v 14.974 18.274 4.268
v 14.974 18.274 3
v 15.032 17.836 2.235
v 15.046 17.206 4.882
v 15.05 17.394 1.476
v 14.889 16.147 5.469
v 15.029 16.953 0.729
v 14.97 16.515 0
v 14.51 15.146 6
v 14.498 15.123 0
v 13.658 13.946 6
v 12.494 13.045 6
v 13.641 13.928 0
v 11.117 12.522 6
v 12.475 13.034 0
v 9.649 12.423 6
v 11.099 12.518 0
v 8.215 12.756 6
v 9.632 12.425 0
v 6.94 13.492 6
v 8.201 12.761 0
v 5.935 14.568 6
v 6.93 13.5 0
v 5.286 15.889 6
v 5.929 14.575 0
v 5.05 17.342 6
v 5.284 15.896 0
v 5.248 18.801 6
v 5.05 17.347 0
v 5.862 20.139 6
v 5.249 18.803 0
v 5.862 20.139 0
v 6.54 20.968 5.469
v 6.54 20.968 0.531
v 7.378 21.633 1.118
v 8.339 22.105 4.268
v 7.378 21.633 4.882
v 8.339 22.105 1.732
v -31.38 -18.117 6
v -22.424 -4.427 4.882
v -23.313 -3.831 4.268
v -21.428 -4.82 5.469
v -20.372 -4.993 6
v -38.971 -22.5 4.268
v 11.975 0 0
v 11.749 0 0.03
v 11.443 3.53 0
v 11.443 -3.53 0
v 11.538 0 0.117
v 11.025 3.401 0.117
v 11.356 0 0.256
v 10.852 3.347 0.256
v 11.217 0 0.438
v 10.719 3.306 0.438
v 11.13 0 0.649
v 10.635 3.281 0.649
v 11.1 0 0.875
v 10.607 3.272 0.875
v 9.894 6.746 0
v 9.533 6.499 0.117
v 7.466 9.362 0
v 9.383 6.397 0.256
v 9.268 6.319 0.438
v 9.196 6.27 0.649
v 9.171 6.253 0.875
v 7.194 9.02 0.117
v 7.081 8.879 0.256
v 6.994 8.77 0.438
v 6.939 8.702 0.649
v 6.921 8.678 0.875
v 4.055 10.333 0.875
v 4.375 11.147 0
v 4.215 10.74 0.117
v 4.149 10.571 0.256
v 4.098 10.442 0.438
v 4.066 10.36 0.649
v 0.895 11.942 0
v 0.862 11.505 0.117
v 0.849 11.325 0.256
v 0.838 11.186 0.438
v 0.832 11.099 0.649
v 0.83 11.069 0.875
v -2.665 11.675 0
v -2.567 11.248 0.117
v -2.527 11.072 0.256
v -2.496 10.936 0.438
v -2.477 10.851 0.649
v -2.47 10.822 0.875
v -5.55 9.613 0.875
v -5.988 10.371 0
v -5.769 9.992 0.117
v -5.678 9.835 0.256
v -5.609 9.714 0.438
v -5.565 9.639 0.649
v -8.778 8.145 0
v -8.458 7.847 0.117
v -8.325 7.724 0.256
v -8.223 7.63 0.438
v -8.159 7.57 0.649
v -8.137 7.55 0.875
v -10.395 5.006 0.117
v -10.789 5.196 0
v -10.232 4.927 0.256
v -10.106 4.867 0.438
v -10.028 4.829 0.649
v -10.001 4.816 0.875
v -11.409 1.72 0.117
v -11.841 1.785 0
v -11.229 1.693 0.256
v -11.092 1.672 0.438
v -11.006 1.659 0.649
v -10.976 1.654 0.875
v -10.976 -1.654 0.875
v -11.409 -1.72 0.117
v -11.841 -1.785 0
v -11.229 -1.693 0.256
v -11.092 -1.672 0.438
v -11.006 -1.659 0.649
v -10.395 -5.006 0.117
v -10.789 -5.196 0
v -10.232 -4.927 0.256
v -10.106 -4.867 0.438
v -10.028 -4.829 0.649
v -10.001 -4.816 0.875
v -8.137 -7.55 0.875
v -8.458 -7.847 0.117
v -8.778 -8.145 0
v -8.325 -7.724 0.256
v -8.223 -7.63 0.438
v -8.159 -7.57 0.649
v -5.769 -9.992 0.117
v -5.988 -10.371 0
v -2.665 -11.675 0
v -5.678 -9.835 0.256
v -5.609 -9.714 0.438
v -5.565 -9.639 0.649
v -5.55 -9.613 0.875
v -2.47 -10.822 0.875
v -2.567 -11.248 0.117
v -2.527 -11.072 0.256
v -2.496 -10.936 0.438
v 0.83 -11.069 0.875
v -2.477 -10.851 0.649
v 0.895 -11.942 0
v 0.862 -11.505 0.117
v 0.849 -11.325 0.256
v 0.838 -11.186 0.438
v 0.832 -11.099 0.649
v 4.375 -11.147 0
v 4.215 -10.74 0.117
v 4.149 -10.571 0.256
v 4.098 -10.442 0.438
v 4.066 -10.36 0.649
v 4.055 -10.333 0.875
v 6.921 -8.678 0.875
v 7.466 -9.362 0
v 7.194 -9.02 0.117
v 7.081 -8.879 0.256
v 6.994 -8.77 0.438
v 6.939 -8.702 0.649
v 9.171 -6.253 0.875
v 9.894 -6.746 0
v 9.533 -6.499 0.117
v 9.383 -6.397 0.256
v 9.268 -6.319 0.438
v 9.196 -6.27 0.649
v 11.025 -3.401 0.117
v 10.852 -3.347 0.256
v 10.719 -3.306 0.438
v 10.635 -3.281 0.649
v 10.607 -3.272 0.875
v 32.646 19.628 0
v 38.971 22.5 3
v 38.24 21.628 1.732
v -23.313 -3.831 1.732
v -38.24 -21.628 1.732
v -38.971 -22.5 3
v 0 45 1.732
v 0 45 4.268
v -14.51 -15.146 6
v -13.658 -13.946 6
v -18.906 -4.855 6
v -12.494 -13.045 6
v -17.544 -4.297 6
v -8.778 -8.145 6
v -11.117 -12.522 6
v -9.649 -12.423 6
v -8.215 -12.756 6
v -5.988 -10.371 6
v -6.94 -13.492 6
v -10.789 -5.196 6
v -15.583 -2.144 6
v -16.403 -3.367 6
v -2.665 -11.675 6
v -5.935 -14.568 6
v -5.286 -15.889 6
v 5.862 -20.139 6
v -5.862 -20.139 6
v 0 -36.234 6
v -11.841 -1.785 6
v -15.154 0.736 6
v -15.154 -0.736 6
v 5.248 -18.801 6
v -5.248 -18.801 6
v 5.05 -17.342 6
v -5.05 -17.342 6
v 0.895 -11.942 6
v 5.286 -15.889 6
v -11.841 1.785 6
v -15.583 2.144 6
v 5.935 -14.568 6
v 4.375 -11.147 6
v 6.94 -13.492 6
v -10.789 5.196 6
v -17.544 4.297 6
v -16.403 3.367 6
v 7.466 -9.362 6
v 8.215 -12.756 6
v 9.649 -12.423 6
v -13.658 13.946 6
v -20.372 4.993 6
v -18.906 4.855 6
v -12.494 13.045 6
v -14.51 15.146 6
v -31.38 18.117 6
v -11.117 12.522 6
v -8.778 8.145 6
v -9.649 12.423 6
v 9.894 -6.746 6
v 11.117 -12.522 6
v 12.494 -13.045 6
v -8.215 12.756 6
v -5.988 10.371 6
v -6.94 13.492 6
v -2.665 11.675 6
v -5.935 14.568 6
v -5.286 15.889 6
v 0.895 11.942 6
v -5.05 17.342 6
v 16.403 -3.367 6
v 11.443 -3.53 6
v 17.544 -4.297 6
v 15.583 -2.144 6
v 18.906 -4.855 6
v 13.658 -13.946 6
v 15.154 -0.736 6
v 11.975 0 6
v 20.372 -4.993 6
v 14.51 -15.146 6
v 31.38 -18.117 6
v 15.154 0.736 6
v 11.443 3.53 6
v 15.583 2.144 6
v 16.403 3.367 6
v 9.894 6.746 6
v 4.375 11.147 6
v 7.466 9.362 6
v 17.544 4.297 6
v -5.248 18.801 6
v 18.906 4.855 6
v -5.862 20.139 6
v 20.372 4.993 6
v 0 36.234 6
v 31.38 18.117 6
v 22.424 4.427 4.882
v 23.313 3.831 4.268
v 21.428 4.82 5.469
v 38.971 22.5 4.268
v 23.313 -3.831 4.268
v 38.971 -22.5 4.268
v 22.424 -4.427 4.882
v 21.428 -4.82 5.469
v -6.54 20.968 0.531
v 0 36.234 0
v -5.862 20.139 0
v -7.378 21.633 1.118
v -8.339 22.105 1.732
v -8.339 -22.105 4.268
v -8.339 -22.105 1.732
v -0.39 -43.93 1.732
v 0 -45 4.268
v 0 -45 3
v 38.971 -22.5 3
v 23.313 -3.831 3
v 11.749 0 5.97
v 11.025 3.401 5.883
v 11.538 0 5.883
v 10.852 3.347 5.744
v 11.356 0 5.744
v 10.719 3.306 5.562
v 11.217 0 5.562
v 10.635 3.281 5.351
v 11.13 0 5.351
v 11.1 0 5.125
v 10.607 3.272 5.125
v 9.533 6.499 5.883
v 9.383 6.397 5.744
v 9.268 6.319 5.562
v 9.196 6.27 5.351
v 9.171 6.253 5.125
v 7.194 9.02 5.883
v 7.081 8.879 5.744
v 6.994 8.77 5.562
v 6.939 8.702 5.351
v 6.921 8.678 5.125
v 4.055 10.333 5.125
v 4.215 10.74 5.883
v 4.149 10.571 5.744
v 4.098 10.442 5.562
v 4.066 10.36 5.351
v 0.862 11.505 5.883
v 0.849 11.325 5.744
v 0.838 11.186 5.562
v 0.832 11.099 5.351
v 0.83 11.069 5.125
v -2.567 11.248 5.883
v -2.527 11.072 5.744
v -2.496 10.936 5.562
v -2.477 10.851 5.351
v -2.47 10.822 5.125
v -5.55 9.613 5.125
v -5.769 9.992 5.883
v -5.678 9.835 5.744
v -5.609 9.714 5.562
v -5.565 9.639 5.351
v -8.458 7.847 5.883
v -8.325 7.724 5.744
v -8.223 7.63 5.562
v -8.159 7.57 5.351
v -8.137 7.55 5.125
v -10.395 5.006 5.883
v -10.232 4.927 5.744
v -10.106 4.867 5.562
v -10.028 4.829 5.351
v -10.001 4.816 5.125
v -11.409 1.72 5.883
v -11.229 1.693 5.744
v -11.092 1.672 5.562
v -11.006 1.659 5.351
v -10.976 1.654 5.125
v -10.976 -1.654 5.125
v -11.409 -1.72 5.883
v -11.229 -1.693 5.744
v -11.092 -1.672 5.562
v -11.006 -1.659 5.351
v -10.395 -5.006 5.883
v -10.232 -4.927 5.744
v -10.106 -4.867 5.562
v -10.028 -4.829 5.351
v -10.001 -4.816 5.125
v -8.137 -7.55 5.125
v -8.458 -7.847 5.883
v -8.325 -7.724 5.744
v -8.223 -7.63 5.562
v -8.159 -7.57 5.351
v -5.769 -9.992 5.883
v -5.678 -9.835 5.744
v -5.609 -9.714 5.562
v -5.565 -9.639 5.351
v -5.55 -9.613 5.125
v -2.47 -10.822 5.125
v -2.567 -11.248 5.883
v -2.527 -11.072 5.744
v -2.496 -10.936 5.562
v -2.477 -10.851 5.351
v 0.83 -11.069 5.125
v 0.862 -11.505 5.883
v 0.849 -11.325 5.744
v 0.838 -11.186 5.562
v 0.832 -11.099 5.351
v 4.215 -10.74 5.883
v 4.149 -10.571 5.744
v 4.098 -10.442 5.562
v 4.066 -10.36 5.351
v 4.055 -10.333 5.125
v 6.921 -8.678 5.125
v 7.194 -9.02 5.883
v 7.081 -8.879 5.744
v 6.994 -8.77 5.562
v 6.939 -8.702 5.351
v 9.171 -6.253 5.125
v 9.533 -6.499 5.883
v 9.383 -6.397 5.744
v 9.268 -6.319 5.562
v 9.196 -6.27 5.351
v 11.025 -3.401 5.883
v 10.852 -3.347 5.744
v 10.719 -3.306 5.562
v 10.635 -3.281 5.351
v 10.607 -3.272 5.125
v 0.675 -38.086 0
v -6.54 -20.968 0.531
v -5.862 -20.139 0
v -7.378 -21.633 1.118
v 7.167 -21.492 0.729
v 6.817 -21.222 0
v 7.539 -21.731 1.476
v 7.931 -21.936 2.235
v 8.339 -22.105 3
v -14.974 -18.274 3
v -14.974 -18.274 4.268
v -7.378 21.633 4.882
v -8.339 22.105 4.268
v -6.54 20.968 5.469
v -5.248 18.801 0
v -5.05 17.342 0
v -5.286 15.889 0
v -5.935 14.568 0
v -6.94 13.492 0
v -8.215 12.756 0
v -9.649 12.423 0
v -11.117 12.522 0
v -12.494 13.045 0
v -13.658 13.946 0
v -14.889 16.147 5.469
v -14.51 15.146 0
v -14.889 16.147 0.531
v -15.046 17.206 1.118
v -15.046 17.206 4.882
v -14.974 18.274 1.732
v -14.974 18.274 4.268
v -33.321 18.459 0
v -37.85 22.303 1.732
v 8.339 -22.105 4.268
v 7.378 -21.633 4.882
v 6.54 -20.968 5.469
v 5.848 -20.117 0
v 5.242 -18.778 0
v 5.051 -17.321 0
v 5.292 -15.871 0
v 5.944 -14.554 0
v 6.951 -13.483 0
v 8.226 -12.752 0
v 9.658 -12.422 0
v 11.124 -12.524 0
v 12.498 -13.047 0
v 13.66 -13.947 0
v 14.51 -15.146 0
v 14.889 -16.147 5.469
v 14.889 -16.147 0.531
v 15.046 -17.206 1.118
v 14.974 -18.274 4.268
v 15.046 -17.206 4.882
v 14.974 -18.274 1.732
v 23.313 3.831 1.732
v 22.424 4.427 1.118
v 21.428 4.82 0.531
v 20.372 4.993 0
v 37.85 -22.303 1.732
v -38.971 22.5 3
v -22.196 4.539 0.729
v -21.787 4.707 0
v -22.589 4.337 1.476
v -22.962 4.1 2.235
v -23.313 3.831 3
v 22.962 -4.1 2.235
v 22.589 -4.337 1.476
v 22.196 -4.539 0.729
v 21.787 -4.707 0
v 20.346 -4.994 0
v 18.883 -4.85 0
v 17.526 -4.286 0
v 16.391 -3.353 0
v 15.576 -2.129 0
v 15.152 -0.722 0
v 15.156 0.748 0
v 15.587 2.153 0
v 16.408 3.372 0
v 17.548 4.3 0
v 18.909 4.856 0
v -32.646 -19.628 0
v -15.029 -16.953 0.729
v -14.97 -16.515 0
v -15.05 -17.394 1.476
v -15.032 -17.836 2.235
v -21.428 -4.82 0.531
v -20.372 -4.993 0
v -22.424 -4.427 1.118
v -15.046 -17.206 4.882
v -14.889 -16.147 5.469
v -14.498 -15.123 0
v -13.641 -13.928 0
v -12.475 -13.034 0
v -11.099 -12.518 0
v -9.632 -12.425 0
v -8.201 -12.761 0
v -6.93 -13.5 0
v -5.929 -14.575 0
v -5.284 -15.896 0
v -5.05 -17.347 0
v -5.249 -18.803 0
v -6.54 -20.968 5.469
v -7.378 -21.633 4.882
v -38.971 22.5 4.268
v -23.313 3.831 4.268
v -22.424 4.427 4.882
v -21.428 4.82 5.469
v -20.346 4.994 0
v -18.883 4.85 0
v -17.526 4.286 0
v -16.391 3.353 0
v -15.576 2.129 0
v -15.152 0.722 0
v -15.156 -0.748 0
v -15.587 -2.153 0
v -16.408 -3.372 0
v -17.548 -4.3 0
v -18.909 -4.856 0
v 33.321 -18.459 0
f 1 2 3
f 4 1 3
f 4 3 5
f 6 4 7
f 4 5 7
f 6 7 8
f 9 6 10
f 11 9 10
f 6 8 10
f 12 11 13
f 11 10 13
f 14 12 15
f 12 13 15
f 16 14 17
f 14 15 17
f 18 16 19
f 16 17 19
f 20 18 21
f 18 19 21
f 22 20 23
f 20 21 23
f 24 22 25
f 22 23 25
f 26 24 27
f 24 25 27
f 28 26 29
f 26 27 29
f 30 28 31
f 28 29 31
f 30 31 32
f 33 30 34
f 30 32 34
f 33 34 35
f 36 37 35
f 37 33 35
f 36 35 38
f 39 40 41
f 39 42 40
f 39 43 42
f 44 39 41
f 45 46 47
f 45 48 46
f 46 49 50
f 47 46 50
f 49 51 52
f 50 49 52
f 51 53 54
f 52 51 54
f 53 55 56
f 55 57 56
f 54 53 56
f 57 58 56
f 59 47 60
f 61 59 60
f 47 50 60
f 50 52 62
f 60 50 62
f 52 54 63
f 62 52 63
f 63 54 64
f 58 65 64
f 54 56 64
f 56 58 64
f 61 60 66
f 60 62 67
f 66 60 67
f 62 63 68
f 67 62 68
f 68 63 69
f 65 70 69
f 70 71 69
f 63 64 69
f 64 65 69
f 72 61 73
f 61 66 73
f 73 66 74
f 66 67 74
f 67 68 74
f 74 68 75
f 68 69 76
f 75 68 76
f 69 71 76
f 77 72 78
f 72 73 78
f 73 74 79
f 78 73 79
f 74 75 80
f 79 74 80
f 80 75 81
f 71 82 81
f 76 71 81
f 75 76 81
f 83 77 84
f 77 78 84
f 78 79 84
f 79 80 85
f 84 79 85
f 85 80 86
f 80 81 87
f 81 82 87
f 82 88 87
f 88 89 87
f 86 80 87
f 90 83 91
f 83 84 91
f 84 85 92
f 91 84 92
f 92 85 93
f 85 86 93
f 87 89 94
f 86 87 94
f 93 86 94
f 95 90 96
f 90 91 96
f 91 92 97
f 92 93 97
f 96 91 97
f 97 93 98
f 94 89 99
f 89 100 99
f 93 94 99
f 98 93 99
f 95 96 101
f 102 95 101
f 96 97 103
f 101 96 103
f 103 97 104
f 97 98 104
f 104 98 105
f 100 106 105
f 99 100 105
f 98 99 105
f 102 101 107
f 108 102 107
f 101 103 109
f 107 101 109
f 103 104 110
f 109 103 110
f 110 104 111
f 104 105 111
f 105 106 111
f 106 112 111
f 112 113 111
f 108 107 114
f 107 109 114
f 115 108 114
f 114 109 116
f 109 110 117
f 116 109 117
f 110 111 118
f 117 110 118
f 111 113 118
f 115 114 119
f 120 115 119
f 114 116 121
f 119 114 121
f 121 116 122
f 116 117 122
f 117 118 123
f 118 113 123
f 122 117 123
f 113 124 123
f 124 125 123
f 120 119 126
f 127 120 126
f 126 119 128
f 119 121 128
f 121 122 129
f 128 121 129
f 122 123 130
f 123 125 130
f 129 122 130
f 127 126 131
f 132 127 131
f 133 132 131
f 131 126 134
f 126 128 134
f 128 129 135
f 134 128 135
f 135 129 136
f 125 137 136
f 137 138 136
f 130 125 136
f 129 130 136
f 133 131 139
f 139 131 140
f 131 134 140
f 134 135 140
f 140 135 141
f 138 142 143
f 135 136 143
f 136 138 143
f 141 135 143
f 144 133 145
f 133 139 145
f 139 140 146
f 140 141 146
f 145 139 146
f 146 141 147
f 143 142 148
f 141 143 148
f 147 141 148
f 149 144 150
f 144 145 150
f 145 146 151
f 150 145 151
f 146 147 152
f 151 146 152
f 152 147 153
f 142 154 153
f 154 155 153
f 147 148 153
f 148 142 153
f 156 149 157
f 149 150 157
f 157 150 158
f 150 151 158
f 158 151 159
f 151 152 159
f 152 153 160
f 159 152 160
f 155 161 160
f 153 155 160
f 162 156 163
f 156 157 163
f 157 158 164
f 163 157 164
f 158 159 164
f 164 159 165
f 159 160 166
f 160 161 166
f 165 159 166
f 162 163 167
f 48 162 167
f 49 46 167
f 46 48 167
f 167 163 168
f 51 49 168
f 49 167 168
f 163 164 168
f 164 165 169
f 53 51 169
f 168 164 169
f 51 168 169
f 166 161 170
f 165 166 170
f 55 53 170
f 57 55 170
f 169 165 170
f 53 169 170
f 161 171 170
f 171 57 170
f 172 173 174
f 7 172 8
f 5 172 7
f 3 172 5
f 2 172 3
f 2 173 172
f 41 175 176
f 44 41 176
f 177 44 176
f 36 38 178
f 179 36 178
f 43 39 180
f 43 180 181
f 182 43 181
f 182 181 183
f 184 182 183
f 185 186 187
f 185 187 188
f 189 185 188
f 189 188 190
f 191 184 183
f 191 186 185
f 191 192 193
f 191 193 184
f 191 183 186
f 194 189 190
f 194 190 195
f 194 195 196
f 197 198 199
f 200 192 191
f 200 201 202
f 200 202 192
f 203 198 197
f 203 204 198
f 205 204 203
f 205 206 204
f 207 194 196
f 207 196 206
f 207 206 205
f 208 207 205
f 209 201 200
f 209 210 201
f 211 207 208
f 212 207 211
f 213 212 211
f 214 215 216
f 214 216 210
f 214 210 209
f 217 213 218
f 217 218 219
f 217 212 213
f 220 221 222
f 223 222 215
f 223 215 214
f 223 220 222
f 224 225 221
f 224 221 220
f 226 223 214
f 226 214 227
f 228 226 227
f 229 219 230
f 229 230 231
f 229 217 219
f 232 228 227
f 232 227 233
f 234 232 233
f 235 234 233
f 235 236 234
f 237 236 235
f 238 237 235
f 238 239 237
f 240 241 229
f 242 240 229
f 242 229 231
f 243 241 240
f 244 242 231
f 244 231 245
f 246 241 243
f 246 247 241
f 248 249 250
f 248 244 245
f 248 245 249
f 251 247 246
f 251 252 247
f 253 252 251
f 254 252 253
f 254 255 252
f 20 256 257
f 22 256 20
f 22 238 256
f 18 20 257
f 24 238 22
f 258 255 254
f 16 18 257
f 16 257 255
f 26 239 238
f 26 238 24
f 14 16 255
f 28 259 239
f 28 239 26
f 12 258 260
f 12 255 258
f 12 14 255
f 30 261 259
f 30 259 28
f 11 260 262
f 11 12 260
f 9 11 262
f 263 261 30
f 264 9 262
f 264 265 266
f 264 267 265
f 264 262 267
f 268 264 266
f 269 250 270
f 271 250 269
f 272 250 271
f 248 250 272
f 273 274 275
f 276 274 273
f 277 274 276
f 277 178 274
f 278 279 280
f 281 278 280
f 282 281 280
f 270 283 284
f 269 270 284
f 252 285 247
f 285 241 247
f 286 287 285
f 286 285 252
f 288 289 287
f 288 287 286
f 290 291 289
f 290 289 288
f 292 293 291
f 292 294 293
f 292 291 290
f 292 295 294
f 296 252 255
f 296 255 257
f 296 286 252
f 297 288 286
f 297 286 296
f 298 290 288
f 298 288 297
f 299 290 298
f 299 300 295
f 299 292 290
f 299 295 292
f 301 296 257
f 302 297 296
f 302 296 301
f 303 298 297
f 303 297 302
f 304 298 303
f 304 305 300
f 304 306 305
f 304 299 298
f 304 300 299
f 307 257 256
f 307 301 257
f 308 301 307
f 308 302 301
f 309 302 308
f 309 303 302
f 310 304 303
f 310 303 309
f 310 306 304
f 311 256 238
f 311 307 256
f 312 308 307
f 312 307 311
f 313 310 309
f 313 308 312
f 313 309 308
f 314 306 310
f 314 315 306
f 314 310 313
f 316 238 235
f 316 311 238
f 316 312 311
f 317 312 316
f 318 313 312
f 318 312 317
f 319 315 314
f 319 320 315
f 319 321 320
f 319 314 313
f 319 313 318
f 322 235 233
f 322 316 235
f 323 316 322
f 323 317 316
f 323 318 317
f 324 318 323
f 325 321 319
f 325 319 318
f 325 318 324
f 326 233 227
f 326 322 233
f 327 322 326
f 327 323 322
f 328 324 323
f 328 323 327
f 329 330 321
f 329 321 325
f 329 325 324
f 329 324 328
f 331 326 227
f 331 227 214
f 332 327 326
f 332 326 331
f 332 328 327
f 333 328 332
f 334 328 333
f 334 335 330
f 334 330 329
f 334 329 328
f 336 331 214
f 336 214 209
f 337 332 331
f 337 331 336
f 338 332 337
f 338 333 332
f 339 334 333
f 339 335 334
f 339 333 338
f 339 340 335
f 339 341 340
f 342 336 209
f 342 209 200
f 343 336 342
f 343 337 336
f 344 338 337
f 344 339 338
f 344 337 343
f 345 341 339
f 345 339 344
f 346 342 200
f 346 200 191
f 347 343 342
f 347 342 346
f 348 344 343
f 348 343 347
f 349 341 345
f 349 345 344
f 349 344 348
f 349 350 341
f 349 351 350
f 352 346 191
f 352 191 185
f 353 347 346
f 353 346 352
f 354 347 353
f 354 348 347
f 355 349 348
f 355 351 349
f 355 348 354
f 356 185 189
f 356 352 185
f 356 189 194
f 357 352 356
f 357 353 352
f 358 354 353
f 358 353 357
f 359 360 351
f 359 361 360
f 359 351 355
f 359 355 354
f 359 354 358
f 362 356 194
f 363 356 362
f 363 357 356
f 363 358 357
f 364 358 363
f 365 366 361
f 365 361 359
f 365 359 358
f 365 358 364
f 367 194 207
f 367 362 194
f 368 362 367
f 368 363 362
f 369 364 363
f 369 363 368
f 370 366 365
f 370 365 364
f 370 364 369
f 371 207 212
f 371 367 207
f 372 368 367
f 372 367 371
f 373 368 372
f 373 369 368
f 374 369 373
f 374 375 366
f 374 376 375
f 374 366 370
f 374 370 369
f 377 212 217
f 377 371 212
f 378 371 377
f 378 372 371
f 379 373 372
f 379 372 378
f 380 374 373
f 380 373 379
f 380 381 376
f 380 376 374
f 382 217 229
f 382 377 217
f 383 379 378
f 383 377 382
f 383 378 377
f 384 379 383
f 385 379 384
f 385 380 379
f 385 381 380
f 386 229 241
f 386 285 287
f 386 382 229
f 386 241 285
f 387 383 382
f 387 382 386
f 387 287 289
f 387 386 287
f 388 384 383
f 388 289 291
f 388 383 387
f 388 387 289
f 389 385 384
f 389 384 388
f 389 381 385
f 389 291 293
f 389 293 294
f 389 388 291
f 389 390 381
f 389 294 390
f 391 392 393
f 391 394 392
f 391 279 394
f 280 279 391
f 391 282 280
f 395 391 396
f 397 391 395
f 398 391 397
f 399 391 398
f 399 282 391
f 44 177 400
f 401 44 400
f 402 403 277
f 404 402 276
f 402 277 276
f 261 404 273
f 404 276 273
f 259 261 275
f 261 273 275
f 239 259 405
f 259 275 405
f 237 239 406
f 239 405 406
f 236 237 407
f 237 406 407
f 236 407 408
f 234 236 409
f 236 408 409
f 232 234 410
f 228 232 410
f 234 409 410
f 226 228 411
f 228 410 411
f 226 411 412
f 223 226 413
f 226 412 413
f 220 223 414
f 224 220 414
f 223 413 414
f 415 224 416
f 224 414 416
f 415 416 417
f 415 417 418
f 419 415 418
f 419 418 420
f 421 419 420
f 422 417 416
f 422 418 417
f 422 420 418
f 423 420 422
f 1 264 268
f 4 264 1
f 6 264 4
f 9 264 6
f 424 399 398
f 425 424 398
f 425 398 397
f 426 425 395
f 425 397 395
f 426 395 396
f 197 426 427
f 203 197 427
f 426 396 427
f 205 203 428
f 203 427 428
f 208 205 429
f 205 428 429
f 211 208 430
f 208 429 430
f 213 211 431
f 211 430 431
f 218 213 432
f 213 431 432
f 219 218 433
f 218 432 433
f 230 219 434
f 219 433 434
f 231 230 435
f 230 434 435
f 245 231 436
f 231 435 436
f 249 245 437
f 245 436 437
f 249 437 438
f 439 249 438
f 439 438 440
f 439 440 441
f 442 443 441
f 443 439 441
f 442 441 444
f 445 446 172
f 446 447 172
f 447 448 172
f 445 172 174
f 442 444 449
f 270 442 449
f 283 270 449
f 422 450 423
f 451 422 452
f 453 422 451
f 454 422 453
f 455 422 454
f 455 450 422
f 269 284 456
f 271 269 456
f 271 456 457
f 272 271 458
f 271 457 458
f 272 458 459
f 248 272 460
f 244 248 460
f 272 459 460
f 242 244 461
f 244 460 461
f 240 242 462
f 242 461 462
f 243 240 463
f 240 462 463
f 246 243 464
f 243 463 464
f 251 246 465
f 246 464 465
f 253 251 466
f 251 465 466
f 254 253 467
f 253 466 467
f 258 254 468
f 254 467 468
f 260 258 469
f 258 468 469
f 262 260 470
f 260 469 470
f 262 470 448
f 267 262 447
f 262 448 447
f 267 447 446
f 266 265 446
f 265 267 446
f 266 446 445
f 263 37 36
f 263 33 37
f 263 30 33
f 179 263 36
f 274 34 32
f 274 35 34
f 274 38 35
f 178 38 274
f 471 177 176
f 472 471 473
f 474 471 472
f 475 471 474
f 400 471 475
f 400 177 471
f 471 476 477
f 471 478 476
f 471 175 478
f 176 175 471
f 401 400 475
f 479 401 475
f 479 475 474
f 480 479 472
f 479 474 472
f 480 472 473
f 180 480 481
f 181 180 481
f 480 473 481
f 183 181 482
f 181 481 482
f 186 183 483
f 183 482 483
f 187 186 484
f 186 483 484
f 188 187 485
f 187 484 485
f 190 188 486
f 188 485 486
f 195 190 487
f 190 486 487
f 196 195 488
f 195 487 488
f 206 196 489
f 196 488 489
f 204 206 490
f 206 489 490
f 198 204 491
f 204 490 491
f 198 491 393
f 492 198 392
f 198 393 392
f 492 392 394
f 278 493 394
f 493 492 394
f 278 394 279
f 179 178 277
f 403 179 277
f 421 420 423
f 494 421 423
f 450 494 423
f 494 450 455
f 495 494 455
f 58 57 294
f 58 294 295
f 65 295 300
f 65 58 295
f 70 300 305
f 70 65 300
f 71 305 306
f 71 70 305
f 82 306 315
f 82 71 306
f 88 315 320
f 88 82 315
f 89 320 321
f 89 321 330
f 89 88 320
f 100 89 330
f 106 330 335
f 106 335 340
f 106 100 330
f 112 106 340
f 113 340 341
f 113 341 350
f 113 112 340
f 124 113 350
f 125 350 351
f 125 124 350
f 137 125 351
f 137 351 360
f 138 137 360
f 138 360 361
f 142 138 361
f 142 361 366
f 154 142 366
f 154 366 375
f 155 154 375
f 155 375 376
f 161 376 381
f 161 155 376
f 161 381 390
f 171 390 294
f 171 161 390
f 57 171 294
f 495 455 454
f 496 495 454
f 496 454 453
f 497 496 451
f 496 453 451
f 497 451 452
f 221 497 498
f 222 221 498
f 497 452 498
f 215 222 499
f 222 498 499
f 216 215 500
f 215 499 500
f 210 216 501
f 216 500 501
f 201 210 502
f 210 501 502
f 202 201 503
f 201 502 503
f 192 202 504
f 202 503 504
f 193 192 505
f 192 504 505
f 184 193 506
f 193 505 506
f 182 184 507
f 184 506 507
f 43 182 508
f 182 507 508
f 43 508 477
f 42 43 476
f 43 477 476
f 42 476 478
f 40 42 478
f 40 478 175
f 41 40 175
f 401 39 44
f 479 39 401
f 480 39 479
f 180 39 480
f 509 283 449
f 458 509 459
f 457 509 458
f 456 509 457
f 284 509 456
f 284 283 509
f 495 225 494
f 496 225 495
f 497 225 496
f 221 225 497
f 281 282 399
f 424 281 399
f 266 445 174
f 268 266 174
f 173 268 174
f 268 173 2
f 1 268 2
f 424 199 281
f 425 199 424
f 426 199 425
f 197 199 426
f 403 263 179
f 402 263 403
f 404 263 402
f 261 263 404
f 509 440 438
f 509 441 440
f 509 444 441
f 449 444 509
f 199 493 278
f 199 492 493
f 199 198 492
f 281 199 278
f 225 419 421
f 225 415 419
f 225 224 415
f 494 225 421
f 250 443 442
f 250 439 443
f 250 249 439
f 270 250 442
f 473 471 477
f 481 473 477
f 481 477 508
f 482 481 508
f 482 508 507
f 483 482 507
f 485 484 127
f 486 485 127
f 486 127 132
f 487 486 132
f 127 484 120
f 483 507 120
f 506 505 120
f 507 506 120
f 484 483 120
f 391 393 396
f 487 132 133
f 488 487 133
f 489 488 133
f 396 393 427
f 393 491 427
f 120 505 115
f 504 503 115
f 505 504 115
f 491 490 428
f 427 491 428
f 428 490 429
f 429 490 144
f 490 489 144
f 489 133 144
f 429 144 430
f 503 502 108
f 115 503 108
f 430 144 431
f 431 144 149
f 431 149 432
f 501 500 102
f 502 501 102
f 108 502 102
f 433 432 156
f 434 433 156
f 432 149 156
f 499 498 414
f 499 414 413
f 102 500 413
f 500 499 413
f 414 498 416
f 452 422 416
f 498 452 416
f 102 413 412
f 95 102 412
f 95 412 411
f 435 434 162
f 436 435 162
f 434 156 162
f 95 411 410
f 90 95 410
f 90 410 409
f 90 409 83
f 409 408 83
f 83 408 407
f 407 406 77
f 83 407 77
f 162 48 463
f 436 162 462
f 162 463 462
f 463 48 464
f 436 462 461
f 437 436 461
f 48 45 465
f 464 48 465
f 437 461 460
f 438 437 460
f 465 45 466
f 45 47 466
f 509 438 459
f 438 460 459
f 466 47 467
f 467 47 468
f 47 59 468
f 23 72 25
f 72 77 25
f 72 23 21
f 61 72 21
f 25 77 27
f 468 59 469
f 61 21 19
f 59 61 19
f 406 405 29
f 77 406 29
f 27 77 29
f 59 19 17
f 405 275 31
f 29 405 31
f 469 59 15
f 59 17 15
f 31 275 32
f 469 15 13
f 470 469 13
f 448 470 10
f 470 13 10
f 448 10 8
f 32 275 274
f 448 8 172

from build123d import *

# Parameters (mm, degrees)
F0_R         = 11.1
F1_DEPTH     = 6
F2_C1_SIZE2  = 3
F2_C1_SIZE   = 1.7320508076
F2_C2_SIZE2  = 3
F2_C2_SIZE   = 1.7320508076
F2_C3_SIZE2  = 3
F2_C3_SIZE   = 1.7320508076
F2_C4_SIZE2  = 3
F2_C4_SIZE   = 1.7320508076
F2_C5_SIZE2  = 1.7320508076
F2_C5_SIZE   = 3
F2_C6_SIZE2  = 3
F2_C6_SIZE   = 1.7320508076
F2_C7_SIZE2  = 1.7320508076
F2_C7_SIZE   = 3
F2_C8_SIZE2  = 3
F2_C8_SIZE   = 1.7320508076
F2_C9_SIZE2  = 1.7320508076
F2_C9_SIZE   = 3
F2_C10_SIZE2 = 3
F2_C10_SIZE  = 1.7320508076
F2_C11_SIZE2 = 3
F2_C11_SIZE  = 1.7320508076
F2_C12_SIZE2 = 3
F2_C12_SIZE  = 1.7320508076
F2_C13_SIZE2 = 1.7320508076
F2_C13_SIZE  = 3
F2_C14_SIZE2 = 3
F2_C14_SIZE  = 1.7320508076
F2_C15_SIZE2 = 3
F2_C15_SIZE  = 1.7320508076
F2_C16_SIZE2 = 3
F2_C16_SIZE  = 1.7320508076
F2_C17_SIZE2 = 1.7320508076
F2_C17_SIZE  = 3
F2_C18_SIZE2 = 3
F2_C18_SIZE  = 1.7320508076
F2_C19_SIZE2 = 3
F2_C19_SIZE  = 1.7320508076
F2_C20_SIZE2 = 3
F2_C20_SIZE  = 1.7320508076
F2_C21_SIZE2 = 1.7320508076
F2_C21_SIZE  = 3
F2_C22_SIZE2 = 3
F2_C22_SIZE  = 1.7320508076
F2_C23_SIZE2 = 3
F2_C23_SIZE  = 1.7320508076
F2_C24_SIZE2 = 3
F2_C24_SIZE  = 1.7320508076
F3_R         = 0.875


with BuildPart() as f1:
    # F0 (on Top) → F1 (new body)
    with BuildSketch(Plane.XY):
        with BuildLine():
            Line((8.3388454559, 22.1051900243), (0, 45))
            Line((0, 45), (-8.3388454559, 22.1051900243))
            ThreePointArc((-8.3388454559, 22.1051900243), (-7.55, 13.0769835971), (-14.9742333886, 18.2742470152))
            Line((-14.9742333886, 18.2742470152), (-38.9711431703, 22.5))
            Line((-38.9711431703, 22.5), (-23.3130788445, 3.8309430091))
            ThreePointArc((-23.3130788445, 3.8309430091), (-15.1, 0), (-23.3130788445, -3.8309430091))
            Line((-23.3130788445, -3.8309430091), (-38.9711431703, -22.5))
            Line((-38.9711431703, -22.5), (-14.9742333886, -18.2742470152))
            ThreePointArc((-14.9742333886, -18.2742470152), (-7.55, -13.0769835971), (-8.3388454559, -22.1051900243))
            Line((-8.3388454559, -22.1051900243), (0, -45))
            Line((0, -45), (8.3388454559, -22.1051900243))
            ThreePointArc((8.3388454559, -22.1051900243), (7.55, -13.0769835971), (14.9742333886, -18.2742470152))
            Line((14.9742333886, -18.2742470152), (38.9711431703, -22.5))
            Line((38.9711431703, -22.5), (23.3130788445, -3.8309430091))
            ThreePointArc((23.3130788445, -3.8309430091), (15.1, 0), (23.3130788445, 3.8309430091))
            Line((23.3130788445, 3.8309430091), (38.9711431703, 22.5))
            Line((38.9711431703, 22.5), (14.9742333886, 18.2742470152))
            ThreePointArc((14.9742333886, 18.2742470152), (7.55, 13.0769835971), (8.3388454559, 22.1051900243))
        make_face()
        Circle(F0_R, mode=Mode.SUBTRACT)
    extrude(amount=F1_DEPTH)

    # F2: chamfer of 3 x 1.7320508076 on 24 edges, made by hand

    # F2_c1
    f2_c1_edges = [f1.edges().sort_by_distance(p)[0] for p in [
        (31.1421110074, 13.1654715045, 0),
    ]]
    f2_c1_side = f1.faces().sort_by_distance((31.1421110074, 13.1654715045, 0.0346410162))[0]
    chamfer(f2_c1_edges, length=F2_C1_SIZE, length2=F2_C1_SIZE2, reference=f2_c1_side)

    # F2_c2
    f2_c2_edges = [f1.edges().sort_by_distance(p)[0] for p in [
        (31.1421110074, 13.1654715045, 6),
    ]]
    f2_c2_side = f1.faces().sort_by_distance((31.1421110074, 13.1654715045, 5.9653589838))[0]
    chamfer(f2_c2_edges, length=F2_C2_SIZE, length2=F2_C2_SIZE2, reference=f2_c2_side)

    # F2_c3
    f2_c3_edges = [f1.edges().sort_by_distance(p)[0] for p in [
        (24.6756919125, 19.9826322901, 0),
    ]]
    f2_c3_side = f1.faces().sort_by_distance((24.6816996097, 19.9485162005, 0))[0]
    chamfer(f2_c3_edges, length=F2_C3_SIZE, length2=F2_C3_SIZE2, reference=f2_c3_side)

    # F2_c4
    f2_c4_edges = [f1.edges().sort_by_distance(p)[0] for p in [
        (24.6756919125, 19.9826322901, 6),
    ]]
    f2_c4_side = f1.faces().sort_by_distance((24.6756919125, 19.9826322901, 5.9653589838))[0]
    chamfer(f2_c4_edges, length=F2_C4_SIZE, length2=F2_C4_SIZE2, reference=f2_c4_side)

    # F2_c5
    f2_c5_edges = [f1.edges().sort_by_distance(p)[0] for p in [
        (4.169422728, 33.5525950122, 0),
    ]]
    f2_c5_side = f1.faces().sort_by_distance((4.136873479, 33.5407397857, 0))[0]
    chamfer(f2_c5_edges, length=F2_C5_SIZE, length2=F2_C5_SIZE2, reference=f2_c5_side)

    # F2_c6
    f2_c6_edges = [f1.edges().sort_by_distance(p)[0] for p in [
        (4.169422728, 33.5525950122, 6),
    ]]
    f2_c6_side = f1.faces().sort_by_distance((4.169422728, 33.5525950122, 5.9653589838))[0]
    chamfer(f2_c6_edges, length=F2_C6_SIZE, length2=F2_C6_SIZE2, reference=f2_c6_side)

    # F2_c7
    f2_c7_edges = [f1.edges().sort_by_distance(p)[0] for p in [
        (-4.9676212415, 31.3610921973, 0),
    ]]
    f2_c7_side = f1.faces().sort_by_distance((-4.9350719925, 31.3492369708, 0))[0]
    chamfer(f2_c7_edges, length=F2_C7_SIZE, length2=F2_C7_SIZE2, reference=f2_c7_side)

    # F2_c8
    f2_c8_edges = [f1.edges().sort_by_distance(p)[0] for p in [
        (-4.9676212415, 31.3610921973, 6),
    ]]
    f2_c8_side = f1.faces().sort_by_distance((-4.9676212415, 31.3610921973, 5.9653589838))[0]
    chamfer(f2_c8_edges, length=F2_C8_SIZE, length2=F2_C8_SIZE2, reference=f2_c8_side)

    # F2_c9
    f2_c9_edges = [f1.edges().sort_by_distance(p)[0] for p in [
        (-26.9726882794, 20.3871235076, 0),
    ]]
    f2_c9_side = f1.faces().sort_by_distance((-26.9786959766, 20.353007418, 0))[0]
    chamfer(f2_c9_edges, length=F2_C9_SIZE, length2=F2_C9_SIZE2, reference=f2_c9_side)

    # F2_c10
    f2_c10_edges = [f1.edges().sort_by_distance(p)[0] for p in [
        (-26.9726882794, 20.3871235076, 6),
    ]]
    f2_c10_side = f1.faces().sort_by_distance((-26.9726882794, 20.3871235076, 5.9653589838))[0]
    chamfer(f2_c10_edges, length=F2_C10_SIZE, length2=F2_C10_SIZE2, reference=f2_c10_side)

    # F2_c11
    f2_c11_edges = [f1.edges().sort_by_distance(p)[0] for p in [
        (-29.643313154, 11.3784599071, 0),
    ]]
    f2_c11_side = f1.faces().sort_by_distance((-29.6167716023, 11.4007207704, 0))[0]
    chamfer(f2_c11_edges, length=F2_C11_SIZE, length2=F2_C11_SIZE2, reference=f2_c11_side)

    # F2_c12
    f2_c12_edges = [f1.edges().sort_by_distance(p)[0] for p in [
        (-29.643313154, 11.3784599071, 6),
    ]]
    f2_c12_side = f1.faces().sort_by_distance((-29.643313154, 11.3784599071, 5.9653589838))[0]
    chamfer(f2_c12_edges, length=F2_C12_SIZE, length2=F2_C12_SIZE2, reference=f2_c12_side)

    # F2_c13
    f2_c13_edges = [f1.edges().sort_by_distance(p)[0] for p in [
        (-31.1421110074, -13.1654715045, 0),
    ]]
    f2_c13_side = f1.faces().sort_by_distance((-31.1155694557, -13.1877323678, 0))[0]
    chamfer(f2_c13_edges, length=F2_C13_SIZE, length2=F2_C13_SIZE2, reference=f2_c13_side)

    # F2_c14
    f2_c14_edges = [f1.edges().sort_by_distance(p)[0] for p in [
        (-31.1421110074, -13.1654715045, 6),
    ]]
    f2_c14_side = f1.faces().sort_by_distance((-31.1421110074, -13.1654715045, 5.9653589838))[0]
    chamfer(f2_c14_edges, length=F2_C14_SIZE, length2=F2_C14_SIZE2, reference=f2_c14_side)

    # F2_c15
    f2_c15_edges = [f1.edges().sort_by_distance(p)[0] for p in [
        (-24.6756919125, -19.9826322901, 0),
    ]]
    f2_c15_side = f1.faces().sort_by_distance((-24.6816996097, -19.9485162005, 0))[0]
    chamfer(f2_c15_edges, length=F2_C15_SIZE, length2=F2_C15_SIZE2, reference=f2_c15_side)

    # F2_c16
    f2_c16_edges = [f1.edges().sort_by_distance(p)[0] for p in [
        (-24.6756919125, -19.9826322901, 6),
    ]]
    f2_c16_side = f1.faces().sort_by_distance((-24.6756919125, -19.9826322901, 5.9653589838))[0]
    chamfer(f2_c16_edges, length=F2_C16_SIZE, length2=F2_C16_SIZE2, reference=f2_c16_side)

    # F2_c17
    f2_c17_edges = [f1.edges().sort_by_distance(p)[0] for p in [
        (-4.169422728, -33.5525950122, 0),
    ]]
    f2_c17_side = f1.faces().sort_by_distance((-4.136873479, -33.5407397857, 0))[0]
    chamfer(f2_c17_edges, length=F2_C17_SIZE, length2=F2_C17_SIZE2, reference=f2_c17_side)

    # F2_c18
    f2_c18_edges = [f1.edges().sort_by_distance(p)[0] for p in [
        (-4.169422728, -33.5525950122, 6),
    ]]
    f2_c18_side = f1.faces().sort_by_distance((-4.169422728, -33.5525950122, 5.9653589838))[0]
    chamfer(f2_c18_edges, length=F2_C18_SIZE, length2=F2_C18_SIZE2, reference=f2_c18_side)

    # F2_c19
    f2_c19_edges = [f1.edges().sort_by_distance(p)[0] for p in [
        (4.9676212415, -31.3610921973, 0),
    ]]
    f2_c19_side = f1.faces().sort_by_distance((4.9350719925, -31.3492369708, 0))[0]
    chamfer(f2_c19_edges, length=F2_C19_SIZE, length2=F2_C19_SIZE2, reference=f2_c19_side)

    # F2_c20
    f2_c20_edges = [f1.edges().sort_by_distance(p)[0] for p in [
        (4.9676212415, -31.3610921973, 6),
    ]]
    f2_c20_side = f1.faces().sort_by_distance((4.9676212415, -31.3610921973, 5.9653589838))[0]
    chamfer(f2_c20_edges, length=F2_C20_SIZE, length2=F2_C20_SIZE2, reference=f2_c20_side)

    # F2_c21
    f2_c21_edges = [f1.edges().sort_by_distance(p)[0] for p in [
        (26.9726882794, -20.3871235076, 0),
    ]]
    f2_c21_side = f1.faces().sort_by_distance((26.9786959766, -20.353007418, 0))[0]
    chamfer(f2_c21_edges, length=F2_C21_SIZE, length2=F2_C21_SIZE2, reference=f2_c21_side)

    # F2_c22
    f2_c22_edges = [f1.edges().sort_by_distance(p)[0] for p in [
        (26.9726882794, -20.3871235076, 6),
    ]]
    f2_c22_side = f1.faces().sort_by_distance((26.9726882794, -20.3871235076, 5.9653589838))[0]
    chamfer(f2_c22_edges, length=F2_C22_SIZE, length2=F2_C22_SIZE2, reference=f2_c22_side)

    # F2_c23
    f2_c23_edges = [f1.edges().sort_by_distance(p)[0] for p in [
        (29.643313154, -11.3784599071, 0),
    ]]
    f2_c23_side = f1.faces().sort_by_distance((29.6167716023, -11.4007207704, 0))[0]
    chamfer(f2_c23_edges, length=F2_C23_SIZE, length2=F2_C23_SIZE2, reference=f2_c23_side)

    # F2_c24
    f2_c24_edges = [f1.edges().sort_by_distance(p)[0] for p in [
        (29.643313154, -11.3784599071, 6),
    ]]
    f2_c24_side = f1.faces().sort_by_distance((29.643313154, -11.3784599071, 5.9653589838))[0]
    chamfer(f2_c24_edges, length=F2_C24_SIZE, length2=F2_C24_SIZE2, reference=f2_c24_side)

    # F3
    f3_edges = [f1.edges().sort_by_distance(p)[0] for p in [
        (-11.1, 0, 0),
        (-11.1, 0, 6),
    ]]
    fillet(f3_edges, radius=F3_R)


solid = f1.part
